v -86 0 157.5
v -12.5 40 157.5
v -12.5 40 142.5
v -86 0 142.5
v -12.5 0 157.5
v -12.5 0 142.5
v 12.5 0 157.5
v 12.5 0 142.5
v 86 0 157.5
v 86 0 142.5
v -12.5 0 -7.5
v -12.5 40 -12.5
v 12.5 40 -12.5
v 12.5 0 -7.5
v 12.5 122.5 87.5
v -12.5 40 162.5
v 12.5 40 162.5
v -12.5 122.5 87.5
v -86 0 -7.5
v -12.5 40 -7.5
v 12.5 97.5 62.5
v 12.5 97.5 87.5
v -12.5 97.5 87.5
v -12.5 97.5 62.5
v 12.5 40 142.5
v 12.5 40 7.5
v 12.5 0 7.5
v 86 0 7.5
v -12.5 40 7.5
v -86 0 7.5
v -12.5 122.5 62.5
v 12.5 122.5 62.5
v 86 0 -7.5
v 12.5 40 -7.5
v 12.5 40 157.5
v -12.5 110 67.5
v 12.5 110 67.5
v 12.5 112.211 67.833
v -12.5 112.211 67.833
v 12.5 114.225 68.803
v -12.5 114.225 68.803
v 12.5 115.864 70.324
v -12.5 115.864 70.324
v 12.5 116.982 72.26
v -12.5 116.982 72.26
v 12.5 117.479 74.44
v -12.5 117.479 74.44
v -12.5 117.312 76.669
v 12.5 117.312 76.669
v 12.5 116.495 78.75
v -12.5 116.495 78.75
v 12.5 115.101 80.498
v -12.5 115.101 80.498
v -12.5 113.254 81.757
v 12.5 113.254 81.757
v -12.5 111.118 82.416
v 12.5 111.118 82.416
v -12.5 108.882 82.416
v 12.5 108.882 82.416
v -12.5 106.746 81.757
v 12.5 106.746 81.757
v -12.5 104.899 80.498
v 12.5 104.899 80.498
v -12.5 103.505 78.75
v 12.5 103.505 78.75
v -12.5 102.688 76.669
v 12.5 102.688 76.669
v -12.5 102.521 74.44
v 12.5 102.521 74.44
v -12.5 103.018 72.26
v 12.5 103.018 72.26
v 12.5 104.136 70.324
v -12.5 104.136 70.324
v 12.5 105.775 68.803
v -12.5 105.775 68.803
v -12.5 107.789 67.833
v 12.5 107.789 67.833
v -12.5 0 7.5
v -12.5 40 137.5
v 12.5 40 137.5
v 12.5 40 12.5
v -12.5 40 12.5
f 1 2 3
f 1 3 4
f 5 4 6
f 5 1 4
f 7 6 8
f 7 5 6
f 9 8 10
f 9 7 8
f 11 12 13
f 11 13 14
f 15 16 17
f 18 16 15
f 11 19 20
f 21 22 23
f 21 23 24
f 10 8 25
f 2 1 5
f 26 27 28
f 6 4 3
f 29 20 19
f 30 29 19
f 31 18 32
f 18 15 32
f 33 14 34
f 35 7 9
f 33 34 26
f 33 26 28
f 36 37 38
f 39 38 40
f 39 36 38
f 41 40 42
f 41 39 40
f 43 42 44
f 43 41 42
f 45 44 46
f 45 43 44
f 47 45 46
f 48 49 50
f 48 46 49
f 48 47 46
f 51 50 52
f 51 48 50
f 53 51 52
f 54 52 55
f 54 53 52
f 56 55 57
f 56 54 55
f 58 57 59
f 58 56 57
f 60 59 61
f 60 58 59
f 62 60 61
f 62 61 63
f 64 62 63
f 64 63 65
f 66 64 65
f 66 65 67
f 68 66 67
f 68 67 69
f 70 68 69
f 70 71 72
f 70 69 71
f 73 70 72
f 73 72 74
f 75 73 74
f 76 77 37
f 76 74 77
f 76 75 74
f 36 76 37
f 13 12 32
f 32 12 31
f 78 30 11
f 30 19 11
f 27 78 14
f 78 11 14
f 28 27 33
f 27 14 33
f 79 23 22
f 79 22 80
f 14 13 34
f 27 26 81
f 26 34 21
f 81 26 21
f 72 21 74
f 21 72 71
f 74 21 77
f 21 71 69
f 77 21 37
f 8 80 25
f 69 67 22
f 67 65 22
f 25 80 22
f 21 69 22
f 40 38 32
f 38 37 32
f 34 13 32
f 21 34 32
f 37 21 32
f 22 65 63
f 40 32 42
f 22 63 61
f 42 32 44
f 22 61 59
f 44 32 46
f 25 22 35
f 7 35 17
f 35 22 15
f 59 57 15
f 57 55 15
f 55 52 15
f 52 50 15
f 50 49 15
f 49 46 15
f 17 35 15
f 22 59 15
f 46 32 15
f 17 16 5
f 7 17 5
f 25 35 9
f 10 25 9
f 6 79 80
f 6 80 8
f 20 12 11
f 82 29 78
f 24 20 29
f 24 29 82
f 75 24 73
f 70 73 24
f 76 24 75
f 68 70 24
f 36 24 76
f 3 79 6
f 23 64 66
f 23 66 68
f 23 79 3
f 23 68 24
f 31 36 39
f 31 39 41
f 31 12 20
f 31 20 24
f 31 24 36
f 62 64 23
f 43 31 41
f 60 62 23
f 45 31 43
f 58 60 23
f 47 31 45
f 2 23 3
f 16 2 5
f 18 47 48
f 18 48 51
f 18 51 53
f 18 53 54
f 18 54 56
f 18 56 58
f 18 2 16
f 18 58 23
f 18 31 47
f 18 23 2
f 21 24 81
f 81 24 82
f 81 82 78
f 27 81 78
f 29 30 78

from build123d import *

# Parameters (mm, degrees)
SKETCH2_W                = 25
SKETCH2_H                = 5
SKETCH2_H_2              = 15
SKETCH2_W_2              = 73.5
BOSS_EXTRUDE3_DEPTH      = 40
CUT_EXTRUDE1_DEPTH       = 15
CUT_EXTRUDE3_DEPTH       = 25
SKETCH5_W                = 25
SKETCH5_H                = 25
SKETCH5_R                = 7.5
BOSS_EXTRUDE4_DEPTH      = 12.5
BOSS_EXTRUDE4_DEPTH_BACK = 12.5
BOSS_EXTRUDE5_START      = -12.5
BOSS_EXTRUDE5_DEPTH      = 25


with BuildPart() as part:
    # Sketch2 → Boss-Extrude3 (new body)
    with BuildSketch(Plane(origin=(0, 0, 0), x_dir=(1, 0, 0), z_dir=(0, 1, 0))):
        with Locations((0, -10)):
            Rectangle(SKETCH2_W, SKETCH2_H)
        Rectangle(SKETCH2_W, SKETCH2_H_2)
        with Locations((0, 10)):
            Rectangle(SKETCH2_W, SKETCH2_H)
        with Locations((-49.25, 0)):
            Rectangle(SKETCH2_W_2, SKETCH2_H_2)
        with Locations((49.25, 0)):
            Rectangle(SKETCH2_W_2, SKETCH2_H_2)
    extrude(amount=BOSS_EXTRUDE3_DEPTH)

    # Sketch6 → Cut-Extrude1 (cut)
    with BuildSketch(Plane(origin=(0, 0, -7.5), x_dir=(-1, 0, 0), z_dir=(0, 0, -1))):
        Polygon((12.5, 40), (86, 0), (86, 40), align=None)
    cut_extrude1 = extrude(amount=-CUT_EXTRUDE1_DEPTH, mode=Mode.SUBTRACT)

    # Mirror1: Cut-Extrude1 across plane
    add(cut_extrude1.mirror(Plane(origin=(0, 0, 0), x_dir=(0, 0, 1), z_dir=(1, 0, 0))), mode=Mode.SUBTRACT)

    # Sketch7 → Cut-Extrude3 (cut)
    with BuildSketch(Plane.ZY.offset(12.5)):
        Polygon((-12.5, 40), (-7.5, 0), (-12.5, 0), align=None)
    cut_extrude3 = extrude(amount=-CUT_EXTRUDE3_DEPTH, mode=Mode.SUBTRACT)

    # Mirror2: Cut-Extrude3 across plane
    add(cut_extrude3.mirror(Plane.XY), mode=Mode.SUBTRACT)



with BuildPart() as body_2:
    # Sketch5 → Boss-Extrude4 (new body, two sides)
    with BuildSketch(Plane(origin=(0, 0, 0), x_dir=(0, 0, -1), z_dir=(1, 0, 0))) as boss_extrude4_sk:
        with Locations((-75, 110)):
            Rectangle(SKETCH5_W, SKETCH5_H)
        with Locations((-75, 110)):
            Circle(SKETCH5_R, mode=Mode.SUBTRACT)
    extrude(amount=BOSS_EXTRUDE4_DEPTH)
    extrude(boss_extrude4_sk.sketch, amount=-BOSS_EXTRUDE4_DEPTH_BACK)


with BuildPart() as part_1:
    add(part.part)

    add(body_2.part)  # Boss-Extrude5 merges body 2
    # Sketch8 → Boss-Extrude5 (add)
    with BuildSketch(Plane(origin=(0, 0, 0), x_dir=(0, 0, -1), z_dir=(1, 0, 0)).offset(BOSS_EXTRUDE5_START)):
        Polygon((-62.5, 97.5), (-12.5, 40), (12.5, 40), (-62.5, 122.5), align=None)
    extrude(amount=BOSS_EXTRUDE5_DEPTH)

    # Mirror13: part across plane


with BuildPart() as part_2:
    add(part_1.part)
    add(part_1.part.mirror(Plane.XY.offset(75)))


solid = part_2.part
